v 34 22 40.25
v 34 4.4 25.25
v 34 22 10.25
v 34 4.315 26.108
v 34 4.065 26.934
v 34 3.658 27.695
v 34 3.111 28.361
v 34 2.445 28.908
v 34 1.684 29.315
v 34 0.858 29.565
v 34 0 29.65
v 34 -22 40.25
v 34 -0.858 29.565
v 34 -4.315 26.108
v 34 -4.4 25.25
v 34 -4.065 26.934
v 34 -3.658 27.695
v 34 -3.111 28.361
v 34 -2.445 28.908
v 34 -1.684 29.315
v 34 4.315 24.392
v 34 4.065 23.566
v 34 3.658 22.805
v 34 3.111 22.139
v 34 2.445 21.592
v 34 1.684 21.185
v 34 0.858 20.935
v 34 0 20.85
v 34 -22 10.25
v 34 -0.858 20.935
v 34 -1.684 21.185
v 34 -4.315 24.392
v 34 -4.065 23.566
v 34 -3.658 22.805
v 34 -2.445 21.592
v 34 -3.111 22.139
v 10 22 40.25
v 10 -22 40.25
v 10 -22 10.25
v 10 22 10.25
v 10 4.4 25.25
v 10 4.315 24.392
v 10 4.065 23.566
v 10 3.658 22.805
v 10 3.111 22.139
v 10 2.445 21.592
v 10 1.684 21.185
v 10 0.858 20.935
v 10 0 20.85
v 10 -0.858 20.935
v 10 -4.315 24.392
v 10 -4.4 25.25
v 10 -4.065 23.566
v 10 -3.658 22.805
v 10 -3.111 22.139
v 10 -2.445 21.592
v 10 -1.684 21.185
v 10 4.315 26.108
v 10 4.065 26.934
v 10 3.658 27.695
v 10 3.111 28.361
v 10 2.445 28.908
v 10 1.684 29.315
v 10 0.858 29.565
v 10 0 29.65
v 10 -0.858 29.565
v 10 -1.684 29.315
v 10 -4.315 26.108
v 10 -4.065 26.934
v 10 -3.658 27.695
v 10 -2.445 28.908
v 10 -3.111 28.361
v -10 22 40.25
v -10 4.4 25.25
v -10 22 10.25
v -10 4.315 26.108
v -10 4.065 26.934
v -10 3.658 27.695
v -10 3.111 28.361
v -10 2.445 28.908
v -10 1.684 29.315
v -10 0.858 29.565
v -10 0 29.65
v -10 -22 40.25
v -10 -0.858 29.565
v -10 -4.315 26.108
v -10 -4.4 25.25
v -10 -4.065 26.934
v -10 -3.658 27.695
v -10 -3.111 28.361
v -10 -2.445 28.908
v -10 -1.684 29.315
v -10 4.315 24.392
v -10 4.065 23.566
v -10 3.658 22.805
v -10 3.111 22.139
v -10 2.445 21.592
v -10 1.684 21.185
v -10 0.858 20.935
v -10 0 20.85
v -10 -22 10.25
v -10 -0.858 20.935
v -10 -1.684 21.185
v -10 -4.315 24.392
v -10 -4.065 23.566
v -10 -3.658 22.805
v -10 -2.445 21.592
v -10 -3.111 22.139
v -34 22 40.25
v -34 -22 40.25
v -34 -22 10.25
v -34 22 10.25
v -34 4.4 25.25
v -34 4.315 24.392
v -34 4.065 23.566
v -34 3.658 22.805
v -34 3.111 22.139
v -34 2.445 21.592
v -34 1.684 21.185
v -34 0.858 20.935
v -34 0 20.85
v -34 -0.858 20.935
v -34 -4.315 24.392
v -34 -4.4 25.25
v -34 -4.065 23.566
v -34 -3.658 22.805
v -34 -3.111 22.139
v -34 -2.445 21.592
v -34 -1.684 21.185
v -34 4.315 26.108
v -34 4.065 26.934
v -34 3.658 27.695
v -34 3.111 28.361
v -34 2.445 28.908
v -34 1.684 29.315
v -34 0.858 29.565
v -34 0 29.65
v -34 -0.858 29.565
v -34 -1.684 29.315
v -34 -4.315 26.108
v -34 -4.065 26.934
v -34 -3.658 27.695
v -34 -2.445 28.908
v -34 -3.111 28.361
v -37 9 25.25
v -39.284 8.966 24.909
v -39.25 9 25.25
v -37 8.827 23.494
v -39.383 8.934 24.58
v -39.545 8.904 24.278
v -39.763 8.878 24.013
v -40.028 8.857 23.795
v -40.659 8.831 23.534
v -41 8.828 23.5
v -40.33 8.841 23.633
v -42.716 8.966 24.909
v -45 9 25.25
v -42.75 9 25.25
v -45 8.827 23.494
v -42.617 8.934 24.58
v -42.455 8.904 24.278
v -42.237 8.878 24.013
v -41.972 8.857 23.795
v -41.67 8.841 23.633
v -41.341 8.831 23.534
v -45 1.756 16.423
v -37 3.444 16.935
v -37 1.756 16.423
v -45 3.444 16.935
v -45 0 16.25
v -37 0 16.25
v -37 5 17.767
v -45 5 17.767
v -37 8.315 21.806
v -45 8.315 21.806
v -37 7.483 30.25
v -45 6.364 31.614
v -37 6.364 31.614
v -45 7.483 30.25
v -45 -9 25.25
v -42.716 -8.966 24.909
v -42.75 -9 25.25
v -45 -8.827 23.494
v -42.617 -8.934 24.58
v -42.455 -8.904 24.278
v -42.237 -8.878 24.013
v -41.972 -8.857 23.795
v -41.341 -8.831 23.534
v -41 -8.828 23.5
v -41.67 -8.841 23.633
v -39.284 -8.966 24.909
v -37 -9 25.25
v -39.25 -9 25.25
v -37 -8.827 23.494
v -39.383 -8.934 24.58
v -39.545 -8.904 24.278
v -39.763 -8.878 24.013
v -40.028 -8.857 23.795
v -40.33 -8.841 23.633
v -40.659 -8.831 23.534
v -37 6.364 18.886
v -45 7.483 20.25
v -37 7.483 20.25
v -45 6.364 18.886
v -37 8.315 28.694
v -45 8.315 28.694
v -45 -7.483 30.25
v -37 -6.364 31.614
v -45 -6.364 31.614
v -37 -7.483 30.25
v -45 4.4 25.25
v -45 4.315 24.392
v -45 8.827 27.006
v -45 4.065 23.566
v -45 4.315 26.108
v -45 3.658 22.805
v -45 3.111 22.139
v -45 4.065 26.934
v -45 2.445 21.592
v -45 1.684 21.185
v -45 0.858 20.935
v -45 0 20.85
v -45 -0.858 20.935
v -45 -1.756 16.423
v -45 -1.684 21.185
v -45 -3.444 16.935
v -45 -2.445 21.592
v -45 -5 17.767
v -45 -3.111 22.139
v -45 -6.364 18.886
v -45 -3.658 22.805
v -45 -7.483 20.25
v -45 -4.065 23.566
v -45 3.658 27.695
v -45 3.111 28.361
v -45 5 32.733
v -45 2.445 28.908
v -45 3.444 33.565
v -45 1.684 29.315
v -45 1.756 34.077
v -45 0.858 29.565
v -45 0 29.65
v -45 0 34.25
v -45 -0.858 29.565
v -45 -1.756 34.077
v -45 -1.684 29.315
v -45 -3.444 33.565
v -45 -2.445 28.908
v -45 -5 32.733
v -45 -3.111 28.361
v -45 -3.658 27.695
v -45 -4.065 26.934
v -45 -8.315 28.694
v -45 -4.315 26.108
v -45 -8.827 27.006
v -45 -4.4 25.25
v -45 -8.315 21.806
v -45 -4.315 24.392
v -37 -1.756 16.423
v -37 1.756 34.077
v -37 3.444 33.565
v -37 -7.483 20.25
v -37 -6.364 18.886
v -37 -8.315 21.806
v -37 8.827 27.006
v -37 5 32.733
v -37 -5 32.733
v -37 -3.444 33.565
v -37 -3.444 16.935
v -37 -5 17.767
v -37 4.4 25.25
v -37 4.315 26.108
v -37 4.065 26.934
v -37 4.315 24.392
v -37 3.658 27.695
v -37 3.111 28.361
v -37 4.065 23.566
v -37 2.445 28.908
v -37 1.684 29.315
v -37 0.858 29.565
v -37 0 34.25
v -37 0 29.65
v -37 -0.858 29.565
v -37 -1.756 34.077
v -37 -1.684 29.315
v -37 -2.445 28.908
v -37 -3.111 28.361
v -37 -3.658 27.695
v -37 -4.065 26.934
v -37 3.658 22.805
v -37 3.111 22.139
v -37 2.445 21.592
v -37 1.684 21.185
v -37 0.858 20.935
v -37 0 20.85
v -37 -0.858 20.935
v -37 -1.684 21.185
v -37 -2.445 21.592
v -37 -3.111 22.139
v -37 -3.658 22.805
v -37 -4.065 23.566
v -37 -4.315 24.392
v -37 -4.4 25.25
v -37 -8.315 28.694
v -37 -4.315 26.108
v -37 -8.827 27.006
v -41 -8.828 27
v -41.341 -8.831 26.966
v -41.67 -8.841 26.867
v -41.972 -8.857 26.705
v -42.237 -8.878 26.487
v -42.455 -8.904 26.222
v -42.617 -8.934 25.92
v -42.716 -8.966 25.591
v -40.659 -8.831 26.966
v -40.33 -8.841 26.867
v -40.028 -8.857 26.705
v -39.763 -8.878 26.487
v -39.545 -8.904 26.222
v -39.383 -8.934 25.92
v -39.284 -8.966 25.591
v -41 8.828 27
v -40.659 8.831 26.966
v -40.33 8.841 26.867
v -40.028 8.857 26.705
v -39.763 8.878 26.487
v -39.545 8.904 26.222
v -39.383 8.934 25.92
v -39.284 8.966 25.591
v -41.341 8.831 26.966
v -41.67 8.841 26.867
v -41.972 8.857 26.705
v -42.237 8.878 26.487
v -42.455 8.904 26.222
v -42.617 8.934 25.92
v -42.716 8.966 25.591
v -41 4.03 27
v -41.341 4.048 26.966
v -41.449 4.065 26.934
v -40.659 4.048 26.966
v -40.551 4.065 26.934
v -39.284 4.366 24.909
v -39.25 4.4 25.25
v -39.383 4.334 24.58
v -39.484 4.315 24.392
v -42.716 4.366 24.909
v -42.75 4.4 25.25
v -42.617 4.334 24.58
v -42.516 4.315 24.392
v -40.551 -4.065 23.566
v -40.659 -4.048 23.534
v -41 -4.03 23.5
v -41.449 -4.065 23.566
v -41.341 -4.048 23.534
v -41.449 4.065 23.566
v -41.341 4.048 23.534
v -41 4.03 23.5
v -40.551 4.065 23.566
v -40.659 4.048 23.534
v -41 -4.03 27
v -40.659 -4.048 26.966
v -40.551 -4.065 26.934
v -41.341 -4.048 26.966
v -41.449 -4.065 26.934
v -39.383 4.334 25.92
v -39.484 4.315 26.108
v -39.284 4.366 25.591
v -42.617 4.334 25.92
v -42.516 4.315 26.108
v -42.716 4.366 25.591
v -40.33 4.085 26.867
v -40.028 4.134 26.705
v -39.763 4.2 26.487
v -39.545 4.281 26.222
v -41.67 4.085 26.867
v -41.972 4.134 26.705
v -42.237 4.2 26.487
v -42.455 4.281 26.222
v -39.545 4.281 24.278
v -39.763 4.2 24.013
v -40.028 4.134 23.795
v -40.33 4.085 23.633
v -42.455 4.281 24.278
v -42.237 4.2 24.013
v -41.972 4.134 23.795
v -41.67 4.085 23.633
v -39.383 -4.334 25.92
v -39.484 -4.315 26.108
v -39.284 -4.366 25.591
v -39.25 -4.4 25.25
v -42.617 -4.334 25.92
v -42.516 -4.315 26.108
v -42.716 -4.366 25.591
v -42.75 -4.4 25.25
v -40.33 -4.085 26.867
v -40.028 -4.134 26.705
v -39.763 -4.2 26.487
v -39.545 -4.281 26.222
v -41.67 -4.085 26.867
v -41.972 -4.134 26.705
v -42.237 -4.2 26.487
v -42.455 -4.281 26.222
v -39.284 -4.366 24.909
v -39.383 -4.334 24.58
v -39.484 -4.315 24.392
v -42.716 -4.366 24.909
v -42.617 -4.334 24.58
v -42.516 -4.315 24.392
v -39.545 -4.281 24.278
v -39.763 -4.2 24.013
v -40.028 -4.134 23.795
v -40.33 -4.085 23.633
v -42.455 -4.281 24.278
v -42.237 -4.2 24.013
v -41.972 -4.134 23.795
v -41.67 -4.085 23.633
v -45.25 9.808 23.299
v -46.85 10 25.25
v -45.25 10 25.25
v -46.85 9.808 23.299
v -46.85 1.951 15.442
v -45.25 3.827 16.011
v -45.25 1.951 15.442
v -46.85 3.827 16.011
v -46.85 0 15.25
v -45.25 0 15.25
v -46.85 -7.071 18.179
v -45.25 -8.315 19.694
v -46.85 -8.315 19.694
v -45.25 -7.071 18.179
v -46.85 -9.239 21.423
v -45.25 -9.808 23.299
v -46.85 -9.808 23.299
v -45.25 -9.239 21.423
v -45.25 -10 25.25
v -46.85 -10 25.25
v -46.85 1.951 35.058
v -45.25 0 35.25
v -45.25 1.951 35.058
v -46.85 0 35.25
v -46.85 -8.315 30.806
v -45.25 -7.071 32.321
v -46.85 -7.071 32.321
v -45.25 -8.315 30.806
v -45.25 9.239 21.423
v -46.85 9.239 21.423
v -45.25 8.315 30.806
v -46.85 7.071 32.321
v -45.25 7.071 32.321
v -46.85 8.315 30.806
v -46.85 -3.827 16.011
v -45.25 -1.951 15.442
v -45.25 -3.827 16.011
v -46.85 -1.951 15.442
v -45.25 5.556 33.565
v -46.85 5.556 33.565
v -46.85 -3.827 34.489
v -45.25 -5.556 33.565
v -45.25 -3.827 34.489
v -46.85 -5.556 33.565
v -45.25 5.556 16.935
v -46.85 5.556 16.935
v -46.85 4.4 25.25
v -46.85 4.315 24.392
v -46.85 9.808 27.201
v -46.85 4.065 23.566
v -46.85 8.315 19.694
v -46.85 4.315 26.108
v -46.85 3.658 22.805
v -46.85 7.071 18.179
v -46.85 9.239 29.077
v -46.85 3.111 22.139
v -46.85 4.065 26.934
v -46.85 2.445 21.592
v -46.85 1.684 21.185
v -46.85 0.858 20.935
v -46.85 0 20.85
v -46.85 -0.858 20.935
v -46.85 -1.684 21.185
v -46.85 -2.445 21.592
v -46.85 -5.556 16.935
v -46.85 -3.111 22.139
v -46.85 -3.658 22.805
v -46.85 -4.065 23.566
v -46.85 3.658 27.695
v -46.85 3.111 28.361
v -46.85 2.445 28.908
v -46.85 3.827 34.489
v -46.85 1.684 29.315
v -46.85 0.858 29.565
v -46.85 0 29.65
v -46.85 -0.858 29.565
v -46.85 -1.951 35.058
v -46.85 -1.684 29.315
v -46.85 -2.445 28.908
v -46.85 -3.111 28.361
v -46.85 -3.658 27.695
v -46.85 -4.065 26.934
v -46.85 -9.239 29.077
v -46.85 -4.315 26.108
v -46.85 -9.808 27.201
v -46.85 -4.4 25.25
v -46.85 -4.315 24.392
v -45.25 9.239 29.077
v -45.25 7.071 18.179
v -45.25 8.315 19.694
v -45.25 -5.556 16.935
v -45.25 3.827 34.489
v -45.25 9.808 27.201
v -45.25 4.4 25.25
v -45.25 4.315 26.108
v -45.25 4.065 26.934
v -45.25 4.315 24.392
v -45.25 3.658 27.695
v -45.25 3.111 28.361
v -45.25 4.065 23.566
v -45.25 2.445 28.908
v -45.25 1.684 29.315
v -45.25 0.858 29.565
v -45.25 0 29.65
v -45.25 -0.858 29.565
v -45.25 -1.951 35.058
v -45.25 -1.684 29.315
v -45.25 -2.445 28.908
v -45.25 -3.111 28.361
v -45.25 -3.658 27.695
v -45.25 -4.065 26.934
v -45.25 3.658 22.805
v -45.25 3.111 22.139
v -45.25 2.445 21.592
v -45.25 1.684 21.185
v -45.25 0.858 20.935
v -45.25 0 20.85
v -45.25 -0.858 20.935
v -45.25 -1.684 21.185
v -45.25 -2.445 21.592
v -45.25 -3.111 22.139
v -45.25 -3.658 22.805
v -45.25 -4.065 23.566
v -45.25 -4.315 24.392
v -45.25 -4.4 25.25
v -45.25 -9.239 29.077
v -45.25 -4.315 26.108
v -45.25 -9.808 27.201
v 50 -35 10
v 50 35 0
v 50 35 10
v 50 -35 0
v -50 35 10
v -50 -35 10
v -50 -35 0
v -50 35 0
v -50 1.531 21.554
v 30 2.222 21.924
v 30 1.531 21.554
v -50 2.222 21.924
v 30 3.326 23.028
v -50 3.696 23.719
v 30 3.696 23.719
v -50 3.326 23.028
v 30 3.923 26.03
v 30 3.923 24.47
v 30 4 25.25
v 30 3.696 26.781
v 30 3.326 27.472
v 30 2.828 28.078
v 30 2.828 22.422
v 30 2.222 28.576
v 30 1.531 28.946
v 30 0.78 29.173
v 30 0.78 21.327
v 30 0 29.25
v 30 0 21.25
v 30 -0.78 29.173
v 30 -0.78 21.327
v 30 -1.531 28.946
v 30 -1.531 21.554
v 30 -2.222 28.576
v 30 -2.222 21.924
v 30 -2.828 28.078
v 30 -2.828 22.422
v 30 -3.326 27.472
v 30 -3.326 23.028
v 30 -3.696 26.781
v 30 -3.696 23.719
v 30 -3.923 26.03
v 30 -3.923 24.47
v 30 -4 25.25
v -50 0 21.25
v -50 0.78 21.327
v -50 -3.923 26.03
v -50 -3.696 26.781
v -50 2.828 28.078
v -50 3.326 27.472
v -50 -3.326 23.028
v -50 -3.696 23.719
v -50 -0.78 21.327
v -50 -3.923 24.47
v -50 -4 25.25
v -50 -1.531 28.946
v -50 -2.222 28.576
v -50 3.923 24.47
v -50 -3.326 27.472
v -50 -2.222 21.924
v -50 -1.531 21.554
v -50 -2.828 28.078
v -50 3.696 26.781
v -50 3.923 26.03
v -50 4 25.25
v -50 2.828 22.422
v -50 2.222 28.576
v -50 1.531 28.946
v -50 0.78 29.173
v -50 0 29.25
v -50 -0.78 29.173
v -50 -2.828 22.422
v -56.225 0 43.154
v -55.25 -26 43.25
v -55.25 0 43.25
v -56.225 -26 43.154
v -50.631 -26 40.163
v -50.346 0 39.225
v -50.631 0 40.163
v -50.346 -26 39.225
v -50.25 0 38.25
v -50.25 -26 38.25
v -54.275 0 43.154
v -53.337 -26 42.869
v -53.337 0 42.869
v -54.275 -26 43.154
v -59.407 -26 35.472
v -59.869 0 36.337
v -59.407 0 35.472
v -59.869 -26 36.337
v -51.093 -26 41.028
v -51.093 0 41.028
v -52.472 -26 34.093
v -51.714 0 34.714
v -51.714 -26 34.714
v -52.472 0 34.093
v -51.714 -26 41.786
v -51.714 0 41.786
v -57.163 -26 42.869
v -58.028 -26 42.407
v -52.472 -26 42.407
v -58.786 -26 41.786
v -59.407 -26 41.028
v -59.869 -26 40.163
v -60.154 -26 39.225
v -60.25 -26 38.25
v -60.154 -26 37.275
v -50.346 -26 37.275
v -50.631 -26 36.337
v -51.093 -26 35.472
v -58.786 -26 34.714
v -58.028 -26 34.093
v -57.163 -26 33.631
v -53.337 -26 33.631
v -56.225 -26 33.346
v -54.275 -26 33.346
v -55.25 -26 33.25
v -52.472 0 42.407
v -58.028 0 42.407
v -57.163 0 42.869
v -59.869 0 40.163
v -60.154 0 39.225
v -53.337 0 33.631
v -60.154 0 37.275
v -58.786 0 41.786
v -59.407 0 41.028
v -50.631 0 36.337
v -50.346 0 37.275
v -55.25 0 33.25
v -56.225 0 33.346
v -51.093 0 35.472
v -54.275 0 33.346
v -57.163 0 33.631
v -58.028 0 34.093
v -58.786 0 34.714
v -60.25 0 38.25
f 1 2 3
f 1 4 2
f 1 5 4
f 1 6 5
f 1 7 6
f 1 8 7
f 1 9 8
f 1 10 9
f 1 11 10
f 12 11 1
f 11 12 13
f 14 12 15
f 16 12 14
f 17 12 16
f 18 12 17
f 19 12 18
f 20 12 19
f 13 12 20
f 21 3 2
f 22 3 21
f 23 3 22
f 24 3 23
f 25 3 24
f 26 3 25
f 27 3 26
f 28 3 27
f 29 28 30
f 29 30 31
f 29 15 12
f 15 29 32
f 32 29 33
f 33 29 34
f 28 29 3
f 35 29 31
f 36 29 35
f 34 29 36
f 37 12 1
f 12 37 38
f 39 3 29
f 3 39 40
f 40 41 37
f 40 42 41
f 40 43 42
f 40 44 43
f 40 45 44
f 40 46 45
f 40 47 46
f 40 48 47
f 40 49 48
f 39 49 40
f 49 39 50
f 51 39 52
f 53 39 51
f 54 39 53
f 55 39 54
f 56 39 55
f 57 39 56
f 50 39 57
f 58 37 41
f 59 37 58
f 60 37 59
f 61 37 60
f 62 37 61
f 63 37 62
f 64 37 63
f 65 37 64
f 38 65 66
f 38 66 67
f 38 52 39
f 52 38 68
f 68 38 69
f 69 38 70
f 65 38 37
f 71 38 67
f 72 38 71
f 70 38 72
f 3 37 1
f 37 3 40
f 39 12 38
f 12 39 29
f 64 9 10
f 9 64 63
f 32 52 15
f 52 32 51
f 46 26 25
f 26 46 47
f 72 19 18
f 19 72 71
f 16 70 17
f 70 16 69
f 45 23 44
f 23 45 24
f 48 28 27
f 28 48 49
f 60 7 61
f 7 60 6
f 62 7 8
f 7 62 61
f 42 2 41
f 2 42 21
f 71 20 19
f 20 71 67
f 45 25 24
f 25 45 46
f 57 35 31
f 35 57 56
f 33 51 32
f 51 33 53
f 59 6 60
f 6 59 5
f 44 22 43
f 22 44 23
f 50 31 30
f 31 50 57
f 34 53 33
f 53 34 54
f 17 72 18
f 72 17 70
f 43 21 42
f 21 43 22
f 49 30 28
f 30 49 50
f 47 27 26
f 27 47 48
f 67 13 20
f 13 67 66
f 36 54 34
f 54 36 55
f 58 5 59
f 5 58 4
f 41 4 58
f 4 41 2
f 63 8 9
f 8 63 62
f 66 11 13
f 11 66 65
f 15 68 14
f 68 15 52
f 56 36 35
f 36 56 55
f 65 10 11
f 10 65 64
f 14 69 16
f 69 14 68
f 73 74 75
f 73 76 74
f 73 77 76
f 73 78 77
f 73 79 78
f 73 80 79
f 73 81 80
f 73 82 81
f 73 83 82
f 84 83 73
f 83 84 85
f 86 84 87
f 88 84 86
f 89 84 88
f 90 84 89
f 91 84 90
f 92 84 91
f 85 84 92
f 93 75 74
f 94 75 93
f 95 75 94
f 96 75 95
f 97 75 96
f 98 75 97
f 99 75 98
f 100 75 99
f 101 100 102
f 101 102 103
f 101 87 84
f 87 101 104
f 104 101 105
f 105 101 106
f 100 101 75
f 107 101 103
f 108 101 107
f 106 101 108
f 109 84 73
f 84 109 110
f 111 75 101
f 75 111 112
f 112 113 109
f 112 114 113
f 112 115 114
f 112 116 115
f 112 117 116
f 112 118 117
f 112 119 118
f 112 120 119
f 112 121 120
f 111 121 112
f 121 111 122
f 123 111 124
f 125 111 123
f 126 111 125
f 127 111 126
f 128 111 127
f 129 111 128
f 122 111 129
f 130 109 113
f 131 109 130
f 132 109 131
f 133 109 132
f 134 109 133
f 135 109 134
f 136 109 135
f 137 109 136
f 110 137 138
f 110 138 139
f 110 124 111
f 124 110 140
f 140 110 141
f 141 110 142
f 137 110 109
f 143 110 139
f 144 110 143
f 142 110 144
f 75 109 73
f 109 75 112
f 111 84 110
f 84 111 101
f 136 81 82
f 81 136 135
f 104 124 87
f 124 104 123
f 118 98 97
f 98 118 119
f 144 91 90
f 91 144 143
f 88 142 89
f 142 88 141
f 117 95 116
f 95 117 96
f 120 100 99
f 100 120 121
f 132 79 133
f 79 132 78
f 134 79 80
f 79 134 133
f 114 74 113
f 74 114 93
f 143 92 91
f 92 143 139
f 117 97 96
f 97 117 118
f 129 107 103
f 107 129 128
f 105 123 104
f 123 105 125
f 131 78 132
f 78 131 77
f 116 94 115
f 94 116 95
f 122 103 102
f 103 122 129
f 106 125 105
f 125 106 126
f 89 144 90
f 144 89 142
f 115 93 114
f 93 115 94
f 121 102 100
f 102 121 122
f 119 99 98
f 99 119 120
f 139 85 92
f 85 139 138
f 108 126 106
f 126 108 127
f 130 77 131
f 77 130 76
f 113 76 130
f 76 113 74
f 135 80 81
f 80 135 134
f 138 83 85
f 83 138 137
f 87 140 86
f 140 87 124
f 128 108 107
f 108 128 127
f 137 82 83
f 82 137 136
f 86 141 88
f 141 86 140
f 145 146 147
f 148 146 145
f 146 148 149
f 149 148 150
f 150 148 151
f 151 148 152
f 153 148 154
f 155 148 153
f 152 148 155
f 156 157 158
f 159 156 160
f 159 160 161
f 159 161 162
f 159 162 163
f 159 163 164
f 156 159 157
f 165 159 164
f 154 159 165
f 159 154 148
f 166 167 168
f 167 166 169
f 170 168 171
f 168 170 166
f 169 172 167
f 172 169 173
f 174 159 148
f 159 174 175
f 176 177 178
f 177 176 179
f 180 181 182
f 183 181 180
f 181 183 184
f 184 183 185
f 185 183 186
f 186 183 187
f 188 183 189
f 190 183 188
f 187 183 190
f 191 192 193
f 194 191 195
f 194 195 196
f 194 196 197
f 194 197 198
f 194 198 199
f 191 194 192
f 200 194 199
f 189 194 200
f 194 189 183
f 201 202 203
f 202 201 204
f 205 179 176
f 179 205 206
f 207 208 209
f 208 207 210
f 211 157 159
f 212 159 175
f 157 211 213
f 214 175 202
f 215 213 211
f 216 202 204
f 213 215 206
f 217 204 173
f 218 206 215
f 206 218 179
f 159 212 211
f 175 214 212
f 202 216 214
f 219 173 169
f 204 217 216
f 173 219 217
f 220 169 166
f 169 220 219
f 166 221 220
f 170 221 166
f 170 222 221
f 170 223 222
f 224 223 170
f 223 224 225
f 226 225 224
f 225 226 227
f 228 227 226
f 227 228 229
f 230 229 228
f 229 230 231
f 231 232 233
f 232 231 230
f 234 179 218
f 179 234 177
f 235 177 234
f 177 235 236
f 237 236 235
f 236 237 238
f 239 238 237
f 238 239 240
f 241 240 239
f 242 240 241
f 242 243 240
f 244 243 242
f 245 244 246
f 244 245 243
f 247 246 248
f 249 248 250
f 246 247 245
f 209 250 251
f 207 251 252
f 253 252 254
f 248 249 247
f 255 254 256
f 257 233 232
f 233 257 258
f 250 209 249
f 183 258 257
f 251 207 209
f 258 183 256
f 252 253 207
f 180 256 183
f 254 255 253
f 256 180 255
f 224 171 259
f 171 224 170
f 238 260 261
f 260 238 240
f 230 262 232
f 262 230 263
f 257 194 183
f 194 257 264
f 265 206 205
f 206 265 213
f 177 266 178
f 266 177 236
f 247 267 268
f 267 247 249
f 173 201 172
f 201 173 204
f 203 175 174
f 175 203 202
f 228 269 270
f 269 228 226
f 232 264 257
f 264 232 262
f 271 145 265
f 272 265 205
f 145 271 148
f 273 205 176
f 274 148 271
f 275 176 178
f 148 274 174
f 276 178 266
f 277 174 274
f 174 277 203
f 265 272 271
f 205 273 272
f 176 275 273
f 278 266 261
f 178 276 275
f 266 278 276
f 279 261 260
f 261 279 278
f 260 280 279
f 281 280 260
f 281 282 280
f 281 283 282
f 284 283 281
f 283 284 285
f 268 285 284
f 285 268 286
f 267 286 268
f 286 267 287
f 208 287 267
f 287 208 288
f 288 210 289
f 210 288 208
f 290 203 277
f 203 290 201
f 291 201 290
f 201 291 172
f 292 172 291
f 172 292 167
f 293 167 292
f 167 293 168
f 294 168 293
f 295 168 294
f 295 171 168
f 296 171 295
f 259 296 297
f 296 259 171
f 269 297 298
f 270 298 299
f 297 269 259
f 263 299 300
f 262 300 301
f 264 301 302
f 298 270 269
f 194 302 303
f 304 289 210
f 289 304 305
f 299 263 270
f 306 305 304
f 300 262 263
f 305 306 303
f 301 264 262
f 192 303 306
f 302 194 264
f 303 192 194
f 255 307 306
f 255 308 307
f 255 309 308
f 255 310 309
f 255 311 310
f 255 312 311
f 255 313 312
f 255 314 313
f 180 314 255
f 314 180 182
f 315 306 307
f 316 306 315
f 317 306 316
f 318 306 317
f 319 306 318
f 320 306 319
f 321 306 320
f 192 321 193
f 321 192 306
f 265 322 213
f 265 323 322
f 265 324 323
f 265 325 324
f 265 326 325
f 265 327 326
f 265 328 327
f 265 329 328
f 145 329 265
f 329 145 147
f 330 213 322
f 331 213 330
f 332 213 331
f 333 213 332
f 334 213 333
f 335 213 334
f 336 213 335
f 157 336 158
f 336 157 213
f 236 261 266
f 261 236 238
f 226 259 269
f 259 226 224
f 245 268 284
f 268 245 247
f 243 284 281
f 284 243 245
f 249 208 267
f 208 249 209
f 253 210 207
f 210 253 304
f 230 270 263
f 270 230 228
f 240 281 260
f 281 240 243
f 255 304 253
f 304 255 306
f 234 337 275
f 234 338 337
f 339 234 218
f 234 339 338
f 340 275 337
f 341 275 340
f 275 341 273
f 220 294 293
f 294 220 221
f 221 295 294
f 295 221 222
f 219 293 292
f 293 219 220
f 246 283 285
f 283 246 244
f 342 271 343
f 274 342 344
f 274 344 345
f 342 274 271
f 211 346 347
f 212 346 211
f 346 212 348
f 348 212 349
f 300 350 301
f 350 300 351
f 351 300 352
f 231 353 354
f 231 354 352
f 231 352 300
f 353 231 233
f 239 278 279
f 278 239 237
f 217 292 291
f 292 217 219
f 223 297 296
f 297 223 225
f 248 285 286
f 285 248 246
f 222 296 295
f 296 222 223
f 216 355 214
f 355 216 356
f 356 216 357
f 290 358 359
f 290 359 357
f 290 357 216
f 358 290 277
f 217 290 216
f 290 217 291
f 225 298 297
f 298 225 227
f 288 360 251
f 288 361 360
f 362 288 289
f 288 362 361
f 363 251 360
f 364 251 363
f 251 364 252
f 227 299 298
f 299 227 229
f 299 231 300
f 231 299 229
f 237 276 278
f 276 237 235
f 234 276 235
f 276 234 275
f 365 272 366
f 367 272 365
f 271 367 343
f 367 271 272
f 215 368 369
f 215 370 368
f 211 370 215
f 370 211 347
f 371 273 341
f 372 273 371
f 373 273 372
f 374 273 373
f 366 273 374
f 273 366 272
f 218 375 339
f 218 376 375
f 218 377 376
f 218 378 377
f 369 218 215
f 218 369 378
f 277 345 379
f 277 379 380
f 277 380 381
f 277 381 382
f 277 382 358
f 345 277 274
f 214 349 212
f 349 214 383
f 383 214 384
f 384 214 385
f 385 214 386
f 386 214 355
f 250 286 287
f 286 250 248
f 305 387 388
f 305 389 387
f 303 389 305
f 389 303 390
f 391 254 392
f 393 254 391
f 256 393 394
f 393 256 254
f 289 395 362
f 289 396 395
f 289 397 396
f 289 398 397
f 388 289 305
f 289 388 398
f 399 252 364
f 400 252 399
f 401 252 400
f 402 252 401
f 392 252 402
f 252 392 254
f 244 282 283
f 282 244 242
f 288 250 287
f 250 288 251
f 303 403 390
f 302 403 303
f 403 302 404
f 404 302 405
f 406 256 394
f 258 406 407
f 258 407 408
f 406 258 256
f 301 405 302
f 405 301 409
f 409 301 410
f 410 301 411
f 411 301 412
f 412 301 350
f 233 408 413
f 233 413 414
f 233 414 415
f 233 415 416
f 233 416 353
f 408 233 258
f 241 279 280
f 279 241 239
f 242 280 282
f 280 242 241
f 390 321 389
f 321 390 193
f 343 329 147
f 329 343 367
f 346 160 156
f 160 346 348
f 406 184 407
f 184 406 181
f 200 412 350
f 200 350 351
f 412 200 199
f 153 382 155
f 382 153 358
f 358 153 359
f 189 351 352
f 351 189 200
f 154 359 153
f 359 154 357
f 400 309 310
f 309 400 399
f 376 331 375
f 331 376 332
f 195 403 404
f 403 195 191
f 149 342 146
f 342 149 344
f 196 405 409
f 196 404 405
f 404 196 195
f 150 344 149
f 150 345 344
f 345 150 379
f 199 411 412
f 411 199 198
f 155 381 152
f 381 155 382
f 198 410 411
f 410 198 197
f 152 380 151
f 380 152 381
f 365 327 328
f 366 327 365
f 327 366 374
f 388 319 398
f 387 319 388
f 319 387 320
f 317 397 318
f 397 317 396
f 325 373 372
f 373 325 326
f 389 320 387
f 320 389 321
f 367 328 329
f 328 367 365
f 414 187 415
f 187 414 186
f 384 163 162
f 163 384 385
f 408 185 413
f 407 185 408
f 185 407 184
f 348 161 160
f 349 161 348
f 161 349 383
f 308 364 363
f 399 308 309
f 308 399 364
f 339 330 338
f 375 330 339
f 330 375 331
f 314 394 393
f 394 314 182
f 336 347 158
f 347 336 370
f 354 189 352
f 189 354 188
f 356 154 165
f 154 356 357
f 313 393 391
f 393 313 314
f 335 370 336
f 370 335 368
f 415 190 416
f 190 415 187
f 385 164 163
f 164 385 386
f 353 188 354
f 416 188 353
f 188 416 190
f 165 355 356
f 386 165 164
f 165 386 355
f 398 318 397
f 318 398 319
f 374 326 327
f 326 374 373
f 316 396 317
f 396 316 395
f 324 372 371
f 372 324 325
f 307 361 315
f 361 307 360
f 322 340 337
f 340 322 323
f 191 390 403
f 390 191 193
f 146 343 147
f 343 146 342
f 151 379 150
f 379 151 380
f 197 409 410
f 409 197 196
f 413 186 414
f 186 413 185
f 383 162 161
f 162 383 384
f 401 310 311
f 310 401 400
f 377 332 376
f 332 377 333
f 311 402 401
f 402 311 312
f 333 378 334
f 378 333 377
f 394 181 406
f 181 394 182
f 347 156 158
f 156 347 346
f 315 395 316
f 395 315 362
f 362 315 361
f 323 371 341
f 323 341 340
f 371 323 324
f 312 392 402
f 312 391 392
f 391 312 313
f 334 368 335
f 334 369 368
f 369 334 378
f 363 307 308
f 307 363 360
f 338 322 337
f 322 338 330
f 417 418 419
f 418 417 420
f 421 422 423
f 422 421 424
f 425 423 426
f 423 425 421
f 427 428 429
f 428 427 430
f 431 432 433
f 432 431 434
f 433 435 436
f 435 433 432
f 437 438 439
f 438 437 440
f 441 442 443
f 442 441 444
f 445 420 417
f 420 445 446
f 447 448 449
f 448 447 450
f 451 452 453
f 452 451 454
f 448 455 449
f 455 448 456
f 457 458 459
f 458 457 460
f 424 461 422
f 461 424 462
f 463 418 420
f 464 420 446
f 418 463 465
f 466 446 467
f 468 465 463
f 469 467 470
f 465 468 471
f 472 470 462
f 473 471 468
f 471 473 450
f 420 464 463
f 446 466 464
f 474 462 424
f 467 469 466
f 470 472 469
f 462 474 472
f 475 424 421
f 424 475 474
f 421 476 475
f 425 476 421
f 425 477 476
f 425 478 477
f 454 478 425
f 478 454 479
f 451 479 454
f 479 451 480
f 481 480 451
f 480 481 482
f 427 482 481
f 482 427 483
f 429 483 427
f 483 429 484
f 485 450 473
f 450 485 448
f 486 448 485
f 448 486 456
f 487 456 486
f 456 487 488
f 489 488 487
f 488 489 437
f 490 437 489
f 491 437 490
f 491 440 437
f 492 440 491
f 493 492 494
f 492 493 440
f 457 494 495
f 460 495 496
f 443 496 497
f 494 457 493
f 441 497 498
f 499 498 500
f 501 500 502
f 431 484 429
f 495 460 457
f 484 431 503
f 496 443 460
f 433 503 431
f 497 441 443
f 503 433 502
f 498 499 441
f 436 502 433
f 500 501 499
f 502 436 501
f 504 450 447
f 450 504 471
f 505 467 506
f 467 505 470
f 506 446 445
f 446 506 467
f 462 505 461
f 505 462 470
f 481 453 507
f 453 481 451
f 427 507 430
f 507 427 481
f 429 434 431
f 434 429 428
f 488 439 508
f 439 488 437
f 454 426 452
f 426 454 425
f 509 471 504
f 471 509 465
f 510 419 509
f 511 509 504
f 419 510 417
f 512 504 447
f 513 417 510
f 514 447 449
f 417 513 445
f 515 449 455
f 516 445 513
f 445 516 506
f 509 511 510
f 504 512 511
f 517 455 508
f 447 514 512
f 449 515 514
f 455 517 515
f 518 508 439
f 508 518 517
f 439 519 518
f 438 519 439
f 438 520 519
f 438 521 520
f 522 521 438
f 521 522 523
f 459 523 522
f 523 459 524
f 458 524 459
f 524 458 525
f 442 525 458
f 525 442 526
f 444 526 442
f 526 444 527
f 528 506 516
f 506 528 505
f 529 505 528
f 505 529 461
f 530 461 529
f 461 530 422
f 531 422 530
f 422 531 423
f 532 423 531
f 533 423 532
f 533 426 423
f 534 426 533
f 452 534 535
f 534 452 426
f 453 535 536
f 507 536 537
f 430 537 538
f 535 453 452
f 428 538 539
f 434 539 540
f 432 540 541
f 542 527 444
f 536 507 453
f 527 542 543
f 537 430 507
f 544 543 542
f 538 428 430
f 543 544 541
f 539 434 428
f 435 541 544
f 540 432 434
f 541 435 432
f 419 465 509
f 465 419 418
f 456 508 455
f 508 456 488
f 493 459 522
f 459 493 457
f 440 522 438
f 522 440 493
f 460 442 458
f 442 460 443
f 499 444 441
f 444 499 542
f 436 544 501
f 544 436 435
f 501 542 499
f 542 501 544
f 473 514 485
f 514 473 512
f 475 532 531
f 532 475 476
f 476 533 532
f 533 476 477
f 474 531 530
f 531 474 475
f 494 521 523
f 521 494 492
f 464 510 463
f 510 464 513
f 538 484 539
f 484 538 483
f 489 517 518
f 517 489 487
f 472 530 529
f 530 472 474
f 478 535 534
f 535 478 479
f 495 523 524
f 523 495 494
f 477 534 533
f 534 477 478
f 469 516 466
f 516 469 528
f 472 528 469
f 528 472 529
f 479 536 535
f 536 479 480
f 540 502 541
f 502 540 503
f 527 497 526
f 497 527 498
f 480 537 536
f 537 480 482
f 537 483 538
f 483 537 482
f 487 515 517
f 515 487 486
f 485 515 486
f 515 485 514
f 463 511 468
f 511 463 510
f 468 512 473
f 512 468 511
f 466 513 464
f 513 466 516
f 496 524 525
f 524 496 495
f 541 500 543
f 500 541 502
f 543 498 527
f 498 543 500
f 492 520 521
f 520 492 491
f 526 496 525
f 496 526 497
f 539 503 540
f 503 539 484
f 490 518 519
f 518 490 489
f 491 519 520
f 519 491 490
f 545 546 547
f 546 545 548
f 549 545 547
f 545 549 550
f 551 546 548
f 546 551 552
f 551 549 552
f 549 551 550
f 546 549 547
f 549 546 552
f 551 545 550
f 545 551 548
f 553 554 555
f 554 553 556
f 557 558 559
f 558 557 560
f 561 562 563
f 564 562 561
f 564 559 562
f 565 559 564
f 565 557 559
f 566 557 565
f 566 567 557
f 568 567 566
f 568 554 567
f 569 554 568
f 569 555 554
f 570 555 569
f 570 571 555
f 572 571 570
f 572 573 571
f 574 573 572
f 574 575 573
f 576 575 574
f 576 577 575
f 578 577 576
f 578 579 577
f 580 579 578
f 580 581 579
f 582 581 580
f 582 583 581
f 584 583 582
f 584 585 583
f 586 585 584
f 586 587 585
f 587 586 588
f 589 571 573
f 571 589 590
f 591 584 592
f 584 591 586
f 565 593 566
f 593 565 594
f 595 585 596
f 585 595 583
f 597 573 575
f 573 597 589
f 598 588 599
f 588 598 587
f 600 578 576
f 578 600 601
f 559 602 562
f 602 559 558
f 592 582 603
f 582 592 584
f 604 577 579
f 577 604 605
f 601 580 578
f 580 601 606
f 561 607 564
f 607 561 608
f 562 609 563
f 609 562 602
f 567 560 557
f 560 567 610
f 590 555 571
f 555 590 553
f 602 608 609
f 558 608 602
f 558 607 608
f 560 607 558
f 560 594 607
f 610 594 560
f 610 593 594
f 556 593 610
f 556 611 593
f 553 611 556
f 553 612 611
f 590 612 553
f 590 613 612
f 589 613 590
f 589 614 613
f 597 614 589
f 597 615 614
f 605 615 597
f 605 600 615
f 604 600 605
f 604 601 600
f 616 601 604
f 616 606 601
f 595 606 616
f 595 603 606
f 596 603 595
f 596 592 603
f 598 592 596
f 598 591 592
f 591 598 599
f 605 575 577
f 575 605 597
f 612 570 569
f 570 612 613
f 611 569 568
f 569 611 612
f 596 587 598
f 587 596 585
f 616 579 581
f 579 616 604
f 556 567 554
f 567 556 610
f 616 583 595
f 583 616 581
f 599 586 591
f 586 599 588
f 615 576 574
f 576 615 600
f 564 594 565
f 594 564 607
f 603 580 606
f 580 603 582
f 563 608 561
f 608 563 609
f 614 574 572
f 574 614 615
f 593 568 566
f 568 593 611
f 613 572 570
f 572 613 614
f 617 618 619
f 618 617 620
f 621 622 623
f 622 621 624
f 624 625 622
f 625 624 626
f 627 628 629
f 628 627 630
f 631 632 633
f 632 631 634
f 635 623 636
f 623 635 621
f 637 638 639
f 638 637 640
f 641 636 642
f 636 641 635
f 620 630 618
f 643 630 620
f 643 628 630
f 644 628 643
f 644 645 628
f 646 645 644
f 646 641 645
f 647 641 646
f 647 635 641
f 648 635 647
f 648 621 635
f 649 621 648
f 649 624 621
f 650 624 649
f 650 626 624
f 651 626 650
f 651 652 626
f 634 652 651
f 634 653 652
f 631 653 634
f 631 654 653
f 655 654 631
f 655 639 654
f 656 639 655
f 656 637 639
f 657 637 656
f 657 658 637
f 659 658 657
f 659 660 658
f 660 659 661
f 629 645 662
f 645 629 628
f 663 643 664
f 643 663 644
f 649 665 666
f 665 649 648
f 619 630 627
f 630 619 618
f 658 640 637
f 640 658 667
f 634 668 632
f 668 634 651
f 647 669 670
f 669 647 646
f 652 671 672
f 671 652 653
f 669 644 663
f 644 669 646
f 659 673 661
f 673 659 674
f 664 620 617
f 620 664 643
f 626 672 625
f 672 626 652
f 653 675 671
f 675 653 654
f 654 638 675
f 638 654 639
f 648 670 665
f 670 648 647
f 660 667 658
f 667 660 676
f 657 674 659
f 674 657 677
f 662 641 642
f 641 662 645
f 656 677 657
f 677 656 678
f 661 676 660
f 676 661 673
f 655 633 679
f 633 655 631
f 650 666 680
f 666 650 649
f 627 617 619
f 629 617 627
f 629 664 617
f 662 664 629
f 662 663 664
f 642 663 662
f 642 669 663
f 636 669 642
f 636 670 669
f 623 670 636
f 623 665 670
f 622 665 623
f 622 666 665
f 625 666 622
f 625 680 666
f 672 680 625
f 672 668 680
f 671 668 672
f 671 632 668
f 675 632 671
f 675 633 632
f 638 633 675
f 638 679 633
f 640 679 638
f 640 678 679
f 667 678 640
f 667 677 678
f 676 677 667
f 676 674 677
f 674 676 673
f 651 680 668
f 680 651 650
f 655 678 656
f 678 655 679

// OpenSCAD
$fn = 32;

// ------------------------------------------------------------------------
// Machine vise: screw d8, jaws 24 x 30 mm
// Every part is its own module, assembly() places every instance.
// ------------------------------------------------------------------------

// --- part 1 ---
module vise_bed() {
  difference() {
    translate([-50, -35, 0]) cube([100, 70, 10]);
  }
}

// --- part 2 ---
module vise_jaw() {
  difference() {
    translate([-12, -22, 0]) cube([24, 44, 30]);
    translate([0, 0, 15]) rotate([0, 90, 0]) cylinder(h = 26, d = 8.8, center = true);
  }
}

// --- part 3 ---
module vise_screw() {
  translate([0, 0, -40]) cylinder(h = 80, d = 8);
}

// --- part 4 ---
module screw_collar() {
  difference() {
    cylinder(h = 8, d = 18);
    translate([0, 0, -1]) cylinder(h = 10, d = 8.8);
    translate([0, 0, 4]) rotate([90, 0, 0]) cylinder(h = 20, d = 3.5, center = true);
  }
}

// --- part 5 ---
module screw_washer() {
  difference() {
      translate([0, 0, 0]) cylinder(h = 1.6, d = 20);
      translate([0, 0, -1]) cylinder(h = 3.6, d = 8.8);
    }
}

// --- part 6 ---
module vise_handle() {
  cylinder(h = 26, d = 10);
}

// --- assembly ---
module assembly() {
  color([0.80, 0.24, 0.20]) translate([0, 0, 0]) rotate([0, 0, 0]) vise_bed();
  color([0.20, 0.45, 0.75]) translate([22, 0, 10.25]) rotate([0, 0, 0]) vise_jaw();
  color([0.25, 0.62, 0.32]) translate([-22, 0, 10.25]) rotate([0, 0, 0]) vise_jaw();
  color([0.92, 0.70, 0.18]) translate([-10, 0, 25.25]) rotate([0, 90, 0]) vise_screw();
  color([0.58, 0.35, 0.70]) translate([-45, 0, 25.25]) rotate([0, 90, 0]) screw_collar();
  color([0.16, 0.66, 0.66]) translate([-46.85, 0, 25.25]) rotate([0, 90, 0]) screw_washer();
  color([0.85, 0.48, 0.18]) translate([-55.25, 0, 38.25]) rotate([90, 0, 0]) vise_handle();
}

assembly();
